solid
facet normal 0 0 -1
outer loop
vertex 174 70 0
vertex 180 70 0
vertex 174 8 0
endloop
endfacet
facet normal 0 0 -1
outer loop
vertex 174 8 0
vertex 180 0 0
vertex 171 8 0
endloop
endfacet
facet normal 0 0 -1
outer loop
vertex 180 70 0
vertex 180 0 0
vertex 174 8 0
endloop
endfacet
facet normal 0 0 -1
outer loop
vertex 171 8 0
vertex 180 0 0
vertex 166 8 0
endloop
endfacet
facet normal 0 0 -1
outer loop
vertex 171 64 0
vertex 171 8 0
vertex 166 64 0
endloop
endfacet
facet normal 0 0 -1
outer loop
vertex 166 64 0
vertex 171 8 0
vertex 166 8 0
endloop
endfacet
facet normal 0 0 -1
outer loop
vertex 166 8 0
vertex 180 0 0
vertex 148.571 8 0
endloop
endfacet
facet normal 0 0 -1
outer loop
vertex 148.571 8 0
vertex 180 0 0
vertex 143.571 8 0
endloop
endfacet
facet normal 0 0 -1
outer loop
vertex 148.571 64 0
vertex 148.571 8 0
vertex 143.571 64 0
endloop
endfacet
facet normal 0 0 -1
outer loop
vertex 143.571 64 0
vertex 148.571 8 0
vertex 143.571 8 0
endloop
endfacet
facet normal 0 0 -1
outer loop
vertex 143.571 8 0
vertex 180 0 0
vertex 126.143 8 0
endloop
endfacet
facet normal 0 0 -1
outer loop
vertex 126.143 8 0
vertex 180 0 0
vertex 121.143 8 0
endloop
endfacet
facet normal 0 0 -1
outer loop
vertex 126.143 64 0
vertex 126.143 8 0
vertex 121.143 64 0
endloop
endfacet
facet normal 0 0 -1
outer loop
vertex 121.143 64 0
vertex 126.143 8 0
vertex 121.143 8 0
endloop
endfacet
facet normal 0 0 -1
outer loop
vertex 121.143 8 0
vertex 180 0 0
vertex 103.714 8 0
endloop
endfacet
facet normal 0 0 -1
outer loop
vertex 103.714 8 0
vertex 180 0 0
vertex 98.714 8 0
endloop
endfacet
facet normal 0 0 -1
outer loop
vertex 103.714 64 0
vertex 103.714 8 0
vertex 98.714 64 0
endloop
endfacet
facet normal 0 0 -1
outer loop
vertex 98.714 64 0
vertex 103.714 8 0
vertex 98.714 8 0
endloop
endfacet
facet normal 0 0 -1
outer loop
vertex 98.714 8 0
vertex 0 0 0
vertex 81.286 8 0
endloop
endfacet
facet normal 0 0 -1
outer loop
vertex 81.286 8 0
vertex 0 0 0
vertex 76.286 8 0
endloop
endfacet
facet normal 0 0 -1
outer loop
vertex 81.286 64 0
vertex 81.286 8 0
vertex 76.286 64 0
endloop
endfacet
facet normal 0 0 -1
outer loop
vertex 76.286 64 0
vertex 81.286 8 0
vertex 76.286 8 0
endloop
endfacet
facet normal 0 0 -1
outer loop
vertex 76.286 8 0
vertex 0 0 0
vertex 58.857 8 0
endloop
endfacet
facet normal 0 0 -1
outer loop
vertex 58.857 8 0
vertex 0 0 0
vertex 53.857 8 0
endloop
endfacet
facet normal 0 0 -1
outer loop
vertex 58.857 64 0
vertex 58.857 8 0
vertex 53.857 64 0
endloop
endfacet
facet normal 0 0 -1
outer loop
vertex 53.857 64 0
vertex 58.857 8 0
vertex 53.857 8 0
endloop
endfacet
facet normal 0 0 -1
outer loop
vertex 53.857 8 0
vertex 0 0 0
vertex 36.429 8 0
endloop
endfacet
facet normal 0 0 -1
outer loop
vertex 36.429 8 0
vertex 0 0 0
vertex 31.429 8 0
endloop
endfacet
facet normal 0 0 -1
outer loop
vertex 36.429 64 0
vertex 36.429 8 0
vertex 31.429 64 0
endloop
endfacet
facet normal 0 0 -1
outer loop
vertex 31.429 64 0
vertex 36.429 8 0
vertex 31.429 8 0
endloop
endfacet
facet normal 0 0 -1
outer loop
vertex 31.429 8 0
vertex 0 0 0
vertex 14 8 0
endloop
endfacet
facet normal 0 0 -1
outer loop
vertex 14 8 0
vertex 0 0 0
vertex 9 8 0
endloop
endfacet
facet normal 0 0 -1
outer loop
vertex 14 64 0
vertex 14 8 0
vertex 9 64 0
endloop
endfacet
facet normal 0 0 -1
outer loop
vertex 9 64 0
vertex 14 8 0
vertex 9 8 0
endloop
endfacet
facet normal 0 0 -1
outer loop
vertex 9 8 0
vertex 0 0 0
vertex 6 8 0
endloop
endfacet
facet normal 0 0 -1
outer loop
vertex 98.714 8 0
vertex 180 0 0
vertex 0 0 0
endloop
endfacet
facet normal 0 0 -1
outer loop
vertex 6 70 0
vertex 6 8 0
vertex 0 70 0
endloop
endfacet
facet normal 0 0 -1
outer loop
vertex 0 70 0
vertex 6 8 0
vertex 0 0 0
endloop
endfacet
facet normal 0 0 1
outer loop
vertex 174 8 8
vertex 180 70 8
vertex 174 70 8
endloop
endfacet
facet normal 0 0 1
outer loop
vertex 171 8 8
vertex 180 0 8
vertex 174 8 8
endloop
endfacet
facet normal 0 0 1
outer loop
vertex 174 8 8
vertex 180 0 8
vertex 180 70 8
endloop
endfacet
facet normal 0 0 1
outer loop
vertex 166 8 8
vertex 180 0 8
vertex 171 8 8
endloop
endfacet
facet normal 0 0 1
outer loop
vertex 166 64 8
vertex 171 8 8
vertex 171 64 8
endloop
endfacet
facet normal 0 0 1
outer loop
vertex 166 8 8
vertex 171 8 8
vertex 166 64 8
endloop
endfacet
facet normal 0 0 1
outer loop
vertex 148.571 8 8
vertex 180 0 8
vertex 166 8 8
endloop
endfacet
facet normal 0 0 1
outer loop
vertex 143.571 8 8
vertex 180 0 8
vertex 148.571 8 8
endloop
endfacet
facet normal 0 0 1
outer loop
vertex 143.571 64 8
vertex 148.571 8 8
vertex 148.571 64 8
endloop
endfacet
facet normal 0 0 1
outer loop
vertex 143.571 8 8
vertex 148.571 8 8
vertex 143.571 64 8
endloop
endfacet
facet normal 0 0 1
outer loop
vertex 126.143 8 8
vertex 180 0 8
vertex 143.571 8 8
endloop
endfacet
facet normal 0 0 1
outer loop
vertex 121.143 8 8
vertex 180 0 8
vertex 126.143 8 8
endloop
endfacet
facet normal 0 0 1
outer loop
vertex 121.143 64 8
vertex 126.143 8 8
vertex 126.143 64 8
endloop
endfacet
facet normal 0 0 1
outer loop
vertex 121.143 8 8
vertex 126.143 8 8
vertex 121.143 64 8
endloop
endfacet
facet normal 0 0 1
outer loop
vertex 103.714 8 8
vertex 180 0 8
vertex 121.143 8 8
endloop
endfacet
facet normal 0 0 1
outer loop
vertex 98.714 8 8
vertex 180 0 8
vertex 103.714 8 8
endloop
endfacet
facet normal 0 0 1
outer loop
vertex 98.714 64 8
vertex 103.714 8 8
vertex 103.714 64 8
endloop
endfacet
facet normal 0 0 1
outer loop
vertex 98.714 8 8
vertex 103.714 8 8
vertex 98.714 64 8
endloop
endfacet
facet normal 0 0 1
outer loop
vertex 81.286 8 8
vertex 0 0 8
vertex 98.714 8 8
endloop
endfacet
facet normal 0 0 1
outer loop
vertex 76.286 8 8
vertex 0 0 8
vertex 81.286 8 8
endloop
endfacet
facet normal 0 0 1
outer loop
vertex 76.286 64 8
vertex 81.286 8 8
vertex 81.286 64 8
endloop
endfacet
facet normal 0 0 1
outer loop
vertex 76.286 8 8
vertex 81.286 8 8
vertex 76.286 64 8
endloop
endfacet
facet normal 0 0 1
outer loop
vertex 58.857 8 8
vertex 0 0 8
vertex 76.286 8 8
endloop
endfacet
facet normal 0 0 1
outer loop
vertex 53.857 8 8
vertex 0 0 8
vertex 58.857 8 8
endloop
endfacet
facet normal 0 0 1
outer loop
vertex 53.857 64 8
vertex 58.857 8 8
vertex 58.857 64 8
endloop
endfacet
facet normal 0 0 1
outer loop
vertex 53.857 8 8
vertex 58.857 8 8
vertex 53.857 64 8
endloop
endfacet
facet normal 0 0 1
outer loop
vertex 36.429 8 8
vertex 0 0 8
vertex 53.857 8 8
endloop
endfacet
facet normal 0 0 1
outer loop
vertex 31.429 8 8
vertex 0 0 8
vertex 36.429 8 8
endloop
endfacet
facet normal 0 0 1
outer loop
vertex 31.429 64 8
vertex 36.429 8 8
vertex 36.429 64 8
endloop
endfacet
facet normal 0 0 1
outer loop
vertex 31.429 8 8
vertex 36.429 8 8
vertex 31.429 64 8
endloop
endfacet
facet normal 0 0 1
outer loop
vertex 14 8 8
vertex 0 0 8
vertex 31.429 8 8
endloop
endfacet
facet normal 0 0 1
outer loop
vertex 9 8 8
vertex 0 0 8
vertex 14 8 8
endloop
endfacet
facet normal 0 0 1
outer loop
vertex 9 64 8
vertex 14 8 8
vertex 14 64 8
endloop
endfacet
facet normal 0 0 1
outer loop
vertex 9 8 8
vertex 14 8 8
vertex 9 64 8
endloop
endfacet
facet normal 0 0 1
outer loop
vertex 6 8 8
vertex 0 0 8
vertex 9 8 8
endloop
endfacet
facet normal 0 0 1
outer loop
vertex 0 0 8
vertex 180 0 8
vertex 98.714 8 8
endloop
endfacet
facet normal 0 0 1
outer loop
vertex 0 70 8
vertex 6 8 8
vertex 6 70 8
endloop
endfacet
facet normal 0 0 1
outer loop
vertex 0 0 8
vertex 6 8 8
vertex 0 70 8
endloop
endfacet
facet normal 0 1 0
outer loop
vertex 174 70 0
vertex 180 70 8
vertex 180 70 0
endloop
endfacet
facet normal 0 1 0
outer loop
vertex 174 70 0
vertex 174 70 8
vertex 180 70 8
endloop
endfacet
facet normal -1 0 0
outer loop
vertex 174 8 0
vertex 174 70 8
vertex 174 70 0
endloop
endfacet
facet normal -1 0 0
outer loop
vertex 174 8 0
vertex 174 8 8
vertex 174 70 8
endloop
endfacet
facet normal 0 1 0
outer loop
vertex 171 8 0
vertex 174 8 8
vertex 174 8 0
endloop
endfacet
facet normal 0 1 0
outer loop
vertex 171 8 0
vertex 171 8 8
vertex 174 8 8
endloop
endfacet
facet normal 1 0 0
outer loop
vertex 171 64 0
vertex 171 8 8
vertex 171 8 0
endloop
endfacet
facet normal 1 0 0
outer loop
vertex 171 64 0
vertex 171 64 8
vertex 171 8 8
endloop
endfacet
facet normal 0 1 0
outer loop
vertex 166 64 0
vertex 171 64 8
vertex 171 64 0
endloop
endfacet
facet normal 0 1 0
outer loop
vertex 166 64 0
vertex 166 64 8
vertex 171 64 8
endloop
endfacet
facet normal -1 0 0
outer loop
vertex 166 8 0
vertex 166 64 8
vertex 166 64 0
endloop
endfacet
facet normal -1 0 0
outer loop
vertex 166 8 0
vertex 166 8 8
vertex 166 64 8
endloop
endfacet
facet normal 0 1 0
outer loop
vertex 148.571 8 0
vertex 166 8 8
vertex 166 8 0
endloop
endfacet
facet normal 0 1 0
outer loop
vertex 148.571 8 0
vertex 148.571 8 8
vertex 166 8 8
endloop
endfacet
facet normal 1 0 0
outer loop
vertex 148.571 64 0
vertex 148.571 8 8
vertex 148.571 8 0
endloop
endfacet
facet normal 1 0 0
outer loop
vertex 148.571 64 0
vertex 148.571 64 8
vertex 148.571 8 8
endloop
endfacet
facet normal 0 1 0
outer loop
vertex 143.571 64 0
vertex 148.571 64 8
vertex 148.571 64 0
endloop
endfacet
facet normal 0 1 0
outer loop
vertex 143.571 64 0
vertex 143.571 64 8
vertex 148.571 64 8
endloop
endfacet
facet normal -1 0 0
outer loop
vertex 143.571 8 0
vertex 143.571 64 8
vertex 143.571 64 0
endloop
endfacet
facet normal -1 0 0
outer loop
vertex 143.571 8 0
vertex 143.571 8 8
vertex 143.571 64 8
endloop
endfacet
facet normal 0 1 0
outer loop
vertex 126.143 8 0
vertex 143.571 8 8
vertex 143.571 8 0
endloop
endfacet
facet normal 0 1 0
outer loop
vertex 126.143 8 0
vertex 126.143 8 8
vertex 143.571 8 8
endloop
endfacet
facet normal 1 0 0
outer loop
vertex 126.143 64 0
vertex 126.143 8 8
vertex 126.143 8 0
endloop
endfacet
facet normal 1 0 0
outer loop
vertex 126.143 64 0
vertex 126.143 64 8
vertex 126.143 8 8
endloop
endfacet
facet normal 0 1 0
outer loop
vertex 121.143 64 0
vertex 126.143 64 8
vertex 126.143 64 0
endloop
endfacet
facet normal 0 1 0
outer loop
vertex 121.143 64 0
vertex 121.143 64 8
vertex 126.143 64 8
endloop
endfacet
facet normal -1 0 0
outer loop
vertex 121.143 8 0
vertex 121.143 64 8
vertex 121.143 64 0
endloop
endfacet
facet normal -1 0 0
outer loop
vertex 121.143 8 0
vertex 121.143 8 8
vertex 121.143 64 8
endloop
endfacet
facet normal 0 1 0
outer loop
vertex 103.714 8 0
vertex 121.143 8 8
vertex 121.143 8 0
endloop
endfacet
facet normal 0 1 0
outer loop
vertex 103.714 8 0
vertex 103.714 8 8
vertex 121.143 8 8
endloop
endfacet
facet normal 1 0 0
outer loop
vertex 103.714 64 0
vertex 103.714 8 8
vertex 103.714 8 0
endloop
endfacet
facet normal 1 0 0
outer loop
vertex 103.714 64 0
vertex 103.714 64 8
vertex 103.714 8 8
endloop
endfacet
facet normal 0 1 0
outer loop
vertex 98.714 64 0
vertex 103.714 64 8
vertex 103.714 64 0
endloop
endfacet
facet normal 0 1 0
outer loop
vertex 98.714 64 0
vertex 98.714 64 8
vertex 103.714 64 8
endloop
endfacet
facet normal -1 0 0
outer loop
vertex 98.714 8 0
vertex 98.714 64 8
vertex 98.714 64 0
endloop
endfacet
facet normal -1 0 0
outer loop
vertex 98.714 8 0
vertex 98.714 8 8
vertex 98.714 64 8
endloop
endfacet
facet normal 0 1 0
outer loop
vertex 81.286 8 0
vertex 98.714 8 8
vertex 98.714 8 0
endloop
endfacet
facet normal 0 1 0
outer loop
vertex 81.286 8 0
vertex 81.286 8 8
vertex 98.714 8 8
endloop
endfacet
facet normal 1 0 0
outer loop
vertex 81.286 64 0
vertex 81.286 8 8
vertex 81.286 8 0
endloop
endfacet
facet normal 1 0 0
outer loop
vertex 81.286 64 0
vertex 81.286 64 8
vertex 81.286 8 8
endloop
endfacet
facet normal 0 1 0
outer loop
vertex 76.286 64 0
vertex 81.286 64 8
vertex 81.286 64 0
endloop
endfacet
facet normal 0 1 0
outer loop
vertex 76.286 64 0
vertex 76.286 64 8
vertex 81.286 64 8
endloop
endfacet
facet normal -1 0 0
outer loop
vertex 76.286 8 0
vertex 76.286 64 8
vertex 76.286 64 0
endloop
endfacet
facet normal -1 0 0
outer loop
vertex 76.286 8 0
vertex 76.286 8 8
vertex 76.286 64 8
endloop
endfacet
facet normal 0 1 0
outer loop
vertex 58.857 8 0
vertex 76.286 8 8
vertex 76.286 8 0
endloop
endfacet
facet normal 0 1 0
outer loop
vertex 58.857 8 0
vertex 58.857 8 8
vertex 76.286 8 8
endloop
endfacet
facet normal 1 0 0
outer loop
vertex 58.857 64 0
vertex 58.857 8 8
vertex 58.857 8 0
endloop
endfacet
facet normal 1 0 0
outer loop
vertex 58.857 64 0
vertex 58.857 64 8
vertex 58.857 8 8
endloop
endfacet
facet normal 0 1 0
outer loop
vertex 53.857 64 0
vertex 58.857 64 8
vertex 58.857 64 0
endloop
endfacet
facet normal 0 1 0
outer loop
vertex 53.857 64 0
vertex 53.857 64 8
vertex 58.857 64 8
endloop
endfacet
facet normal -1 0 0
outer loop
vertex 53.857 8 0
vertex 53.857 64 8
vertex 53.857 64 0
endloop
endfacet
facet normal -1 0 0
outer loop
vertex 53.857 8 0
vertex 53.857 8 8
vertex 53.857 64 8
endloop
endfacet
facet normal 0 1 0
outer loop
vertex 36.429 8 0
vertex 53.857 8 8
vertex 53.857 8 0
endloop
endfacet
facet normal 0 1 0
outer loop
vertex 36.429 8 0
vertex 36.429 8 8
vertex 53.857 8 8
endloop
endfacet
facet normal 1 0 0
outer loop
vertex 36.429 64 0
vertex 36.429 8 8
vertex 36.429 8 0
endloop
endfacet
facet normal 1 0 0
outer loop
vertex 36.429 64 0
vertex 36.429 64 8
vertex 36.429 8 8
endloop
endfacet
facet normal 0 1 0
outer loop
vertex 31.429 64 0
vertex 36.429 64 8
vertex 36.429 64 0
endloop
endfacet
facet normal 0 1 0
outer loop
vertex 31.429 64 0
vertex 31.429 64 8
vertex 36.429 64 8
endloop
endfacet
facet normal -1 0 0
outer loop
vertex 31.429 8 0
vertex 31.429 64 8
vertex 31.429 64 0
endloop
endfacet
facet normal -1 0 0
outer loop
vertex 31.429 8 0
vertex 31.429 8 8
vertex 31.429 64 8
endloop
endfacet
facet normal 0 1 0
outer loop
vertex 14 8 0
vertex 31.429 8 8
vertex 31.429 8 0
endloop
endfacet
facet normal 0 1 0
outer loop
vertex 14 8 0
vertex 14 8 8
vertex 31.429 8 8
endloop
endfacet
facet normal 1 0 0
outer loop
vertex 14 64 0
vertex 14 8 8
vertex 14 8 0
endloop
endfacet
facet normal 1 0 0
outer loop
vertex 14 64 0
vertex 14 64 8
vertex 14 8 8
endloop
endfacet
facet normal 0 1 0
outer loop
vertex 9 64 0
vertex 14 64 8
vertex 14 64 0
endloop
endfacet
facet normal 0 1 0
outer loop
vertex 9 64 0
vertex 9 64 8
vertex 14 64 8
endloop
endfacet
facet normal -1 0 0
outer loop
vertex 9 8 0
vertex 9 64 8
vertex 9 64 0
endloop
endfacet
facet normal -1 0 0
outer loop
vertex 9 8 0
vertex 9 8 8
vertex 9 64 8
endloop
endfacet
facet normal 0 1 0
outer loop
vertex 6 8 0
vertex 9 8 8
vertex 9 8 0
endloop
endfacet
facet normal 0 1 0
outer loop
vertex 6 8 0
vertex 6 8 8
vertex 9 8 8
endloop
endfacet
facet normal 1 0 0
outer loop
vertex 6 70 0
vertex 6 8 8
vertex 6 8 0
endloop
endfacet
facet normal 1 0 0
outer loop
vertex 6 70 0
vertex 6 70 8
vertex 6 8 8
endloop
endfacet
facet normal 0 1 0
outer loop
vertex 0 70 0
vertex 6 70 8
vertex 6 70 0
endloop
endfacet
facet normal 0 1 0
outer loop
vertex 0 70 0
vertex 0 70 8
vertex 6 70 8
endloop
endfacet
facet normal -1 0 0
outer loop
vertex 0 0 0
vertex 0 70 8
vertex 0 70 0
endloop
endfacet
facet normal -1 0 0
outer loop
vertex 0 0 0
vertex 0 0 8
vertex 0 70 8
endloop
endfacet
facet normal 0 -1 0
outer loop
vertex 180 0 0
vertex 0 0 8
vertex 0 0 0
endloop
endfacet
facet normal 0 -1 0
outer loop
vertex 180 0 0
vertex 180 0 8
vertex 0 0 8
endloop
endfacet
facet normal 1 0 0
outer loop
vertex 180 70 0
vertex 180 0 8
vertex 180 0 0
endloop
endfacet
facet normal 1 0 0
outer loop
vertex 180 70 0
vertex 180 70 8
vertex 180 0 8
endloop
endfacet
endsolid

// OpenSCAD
$fn = 32;

// ----------------------------------------------------------------------
// Guard grille: 8 slats over a 180 x 70 mm plate
// ----------------------------------------------------------------------

// --- parameters (mm) ---
profile_height = 8;       // extrusion height
profile_points = 40;      // points of the closed outline

profile = [[0, 0], [180, 0], [180, 70], [174, 70], [174, 8], [171, 8], [171, 64], [166, 64], [166, 8], [148.571, 8], [148.571, 64], [143.571, 64], [143.571, 8], [126.143, 8], [126.143, 64], [121.143, 64], [121.143, 8], [103.714, 8], [103.714, 64], [98.714, 64], [98.714, 8], [81.286, 8], [81.286, 64], [76.286, 64], [76.286, 8], [58.857, 8], [58.857, 64], [53.857, 64], [53.857, 8], [36.429, 8], [36.429, 64], [31.429, 64], [31.429, 8], [14, 8], [14, 64], [9, 64], [9, 8], [6, 8], [6, 70], [0, 70]];  // single closed polygon, 40 points, counter clockwise

// --- the one profile operation ---
linear_extrude(height = profile_height) polygon(points = profile);
